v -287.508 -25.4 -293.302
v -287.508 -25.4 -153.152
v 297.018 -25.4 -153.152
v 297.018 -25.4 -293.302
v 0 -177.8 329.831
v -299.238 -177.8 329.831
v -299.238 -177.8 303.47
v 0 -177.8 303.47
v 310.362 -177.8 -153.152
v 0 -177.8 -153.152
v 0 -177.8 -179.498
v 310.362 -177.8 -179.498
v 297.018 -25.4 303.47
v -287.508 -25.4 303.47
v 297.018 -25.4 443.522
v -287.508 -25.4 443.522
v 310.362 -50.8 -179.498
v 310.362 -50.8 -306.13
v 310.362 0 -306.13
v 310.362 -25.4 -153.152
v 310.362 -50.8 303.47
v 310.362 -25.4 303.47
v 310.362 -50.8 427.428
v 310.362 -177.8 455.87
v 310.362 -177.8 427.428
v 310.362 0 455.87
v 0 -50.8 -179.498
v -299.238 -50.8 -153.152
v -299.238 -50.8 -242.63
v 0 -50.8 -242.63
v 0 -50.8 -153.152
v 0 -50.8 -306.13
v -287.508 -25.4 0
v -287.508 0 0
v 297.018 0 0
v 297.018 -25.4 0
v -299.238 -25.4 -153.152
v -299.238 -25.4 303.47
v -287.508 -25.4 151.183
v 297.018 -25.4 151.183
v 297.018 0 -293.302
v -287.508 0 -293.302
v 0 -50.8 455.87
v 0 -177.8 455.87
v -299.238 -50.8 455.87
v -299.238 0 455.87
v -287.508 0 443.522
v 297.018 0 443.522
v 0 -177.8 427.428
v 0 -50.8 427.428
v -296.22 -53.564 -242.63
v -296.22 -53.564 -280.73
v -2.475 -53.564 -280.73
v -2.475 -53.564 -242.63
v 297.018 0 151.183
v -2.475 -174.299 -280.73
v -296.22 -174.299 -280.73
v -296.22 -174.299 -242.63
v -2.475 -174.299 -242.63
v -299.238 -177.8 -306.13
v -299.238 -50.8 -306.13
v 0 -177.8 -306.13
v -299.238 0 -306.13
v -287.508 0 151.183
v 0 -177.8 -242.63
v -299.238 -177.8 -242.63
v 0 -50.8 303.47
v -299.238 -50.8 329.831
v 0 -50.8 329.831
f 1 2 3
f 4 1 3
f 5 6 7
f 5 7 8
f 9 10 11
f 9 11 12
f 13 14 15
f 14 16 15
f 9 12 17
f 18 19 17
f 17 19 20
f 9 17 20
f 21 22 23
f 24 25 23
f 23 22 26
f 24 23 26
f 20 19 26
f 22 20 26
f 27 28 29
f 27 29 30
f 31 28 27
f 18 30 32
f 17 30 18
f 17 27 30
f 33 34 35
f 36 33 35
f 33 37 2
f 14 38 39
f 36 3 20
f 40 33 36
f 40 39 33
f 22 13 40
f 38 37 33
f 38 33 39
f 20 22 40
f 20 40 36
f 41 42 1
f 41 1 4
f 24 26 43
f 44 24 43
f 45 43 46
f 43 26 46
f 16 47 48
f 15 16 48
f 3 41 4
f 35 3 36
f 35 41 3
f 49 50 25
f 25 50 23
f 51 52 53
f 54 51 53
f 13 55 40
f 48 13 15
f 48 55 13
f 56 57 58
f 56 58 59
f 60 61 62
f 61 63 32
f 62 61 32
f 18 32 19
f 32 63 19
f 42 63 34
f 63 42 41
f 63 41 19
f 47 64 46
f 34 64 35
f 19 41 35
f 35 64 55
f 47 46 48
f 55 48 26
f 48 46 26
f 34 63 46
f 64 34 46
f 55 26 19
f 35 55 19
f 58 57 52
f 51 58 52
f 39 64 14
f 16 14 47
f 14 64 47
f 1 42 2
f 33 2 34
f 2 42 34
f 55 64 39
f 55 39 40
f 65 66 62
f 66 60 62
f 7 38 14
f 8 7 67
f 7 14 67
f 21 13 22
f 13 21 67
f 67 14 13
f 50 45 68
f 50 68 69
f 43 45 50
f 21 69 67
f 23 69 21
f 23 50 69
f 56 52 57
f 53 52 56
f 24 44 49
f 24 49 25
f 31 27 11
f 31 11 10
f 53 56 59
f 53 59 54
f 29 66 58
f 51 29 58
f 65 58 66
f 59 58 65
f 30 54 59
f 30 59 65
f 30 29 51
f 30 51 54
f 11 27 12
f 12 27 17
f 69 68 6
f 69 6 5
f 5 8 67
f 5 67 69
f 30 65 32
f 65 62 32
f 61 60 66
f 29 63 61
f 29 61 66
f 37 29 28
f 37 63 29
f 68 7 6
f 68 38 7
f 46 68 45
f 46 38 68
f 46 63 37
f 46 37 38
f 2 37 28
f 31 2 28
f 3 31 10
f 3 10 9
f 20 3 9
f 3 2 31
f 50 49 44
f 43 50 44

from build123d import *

# Parameters (mm, degrees)
F0_W      = 609.6
F0_H      = 762
F0_W_2    = 584.5253169537
F0_H_2    = 736.8236780167
F1_DEPTH  = 25.4
F2_W      = 584.5253169537
F2_H      = 140.0518767754
F3_DEPTH  = 25.4
F4_W      = 609.6
F4_H      = 152.9776729027
F5_DEPTH  = 25.4
F6_W      = 607.6588928699
F6_H      = 151.1828005314
F7_DEPTH  = 25.4
F8_W      = 310.3615156889
F8_H      = 26.3459533453
F9_DEPTH  = 127
F10_W     = 299.2384843111
F10_H     = 25.4
F11_DEPTH = 127
F12_W     = 299.2384843111
F12_H     = 127
F12_W_2   = 293.7446322758
F12_H_2   = 120.7347996533
F13_DEPTH = 38.1
F14_W     = 299.2384843111
F14_H     = 26.3609342495
F14_W_2   = 310.3615156889
F14_H_2   = 28.4420627674
F15_DEPTH = 127


with BuildPart() as f1:
    # F0 (on Front) → F1 (new body)
    with BuildSketch(Plane.XZ):
        with Locations((5.5615156889, 74.8699506839)):
            Rectangle(F0_W, F0_H)
        with Locations((4.7548860312, 75.109988451)):
            Rectangle(F0_W_2, F0_H_2, mode=Mode.SUBTRACT)
    extrude(amount=F1_DEPTH)

    # F2 (on face) → F3 (join)
    with BuildSketch(Plane.XZ.offset(25.4)):
        with Locations((4.7548860312, 373.4958890716)):
            Rectangle(F2_W, F2_H)
        Polygon((310.3615156889, 455.8699506839), (-299.2384843111, 455.8699506839), (-299.2384843111, 303.4699506839), (-287.5077724457, 303.4699506839), (-287.5077724457, 443.5218274593), (297.017544508, 443.5218274593), (297.017544508, 303.4699506839), (310.3615156889, 303.4699506839), align=None)
    extrude(amount=F3_DEPTH)

    # F4 (on face) → F5 (join)
    with BuildSketch(Plane.XZ.offset(25.4)):
        with Locations((5.5615156889, -229.6412128647)):
            Rectangle(F4_W, F4_H)
    extrude(amount=F5_DEPTH)

    # F6 (on Front) → F7 (join)
    with BuildSketch(Plane.XZ):
        with Locations((5.5615156889, 75.5914002657)):
            Rectangle(F6_W, F6_H)
    extrude(amount=F7_DEPTH)

    # F8 (on face) → F9 (join)
    with BuildSketch(Plane.XZ.offset(50.8)):
        with Locations((155.1807578444, -166.325353086)):
            Rectangle(F8_W, F8_H)
    extrude(amount=F9_DEPTH)

    # F10 (on face) → F11 (join)
    with BuildSketch(Plane.XZ.offset(50.8)):
        with Locations((-149.6192421556, -293.4300493161)):
            Rectangle(F10_W, F10_H)
    extrude(amount=F11_DEPTH)

    # F12 (on face) → F13 (join)
    with BuildSketch(Plane.XY.offset(-280.7300493161)):
        with Locations((-149.6192421556, -114.3)):
            Rectangle(F12_W, F12_H)
        with Locations((-149.3473903975, -113.9315422624)):
            Rectangle(F12_W_2, F12_H_2, mode=Mode.SUBTRACT)
    extrude(amount=F13_DEPTH)

    # F14 (on face) → F15 (join)
    with BuildSketch(Plane.XZ.offset(50.8)):
        with Locations((-149.6192421556, 316.6504178087)):
            Rectangle(F14_W, F14_H)
        with Locations((155.1807578444, 441.6489193003)):
            Rectangle(F14_W_2, F14_H_2)
    extrude(amount=F15_DEPTH)


solid = f1.part
